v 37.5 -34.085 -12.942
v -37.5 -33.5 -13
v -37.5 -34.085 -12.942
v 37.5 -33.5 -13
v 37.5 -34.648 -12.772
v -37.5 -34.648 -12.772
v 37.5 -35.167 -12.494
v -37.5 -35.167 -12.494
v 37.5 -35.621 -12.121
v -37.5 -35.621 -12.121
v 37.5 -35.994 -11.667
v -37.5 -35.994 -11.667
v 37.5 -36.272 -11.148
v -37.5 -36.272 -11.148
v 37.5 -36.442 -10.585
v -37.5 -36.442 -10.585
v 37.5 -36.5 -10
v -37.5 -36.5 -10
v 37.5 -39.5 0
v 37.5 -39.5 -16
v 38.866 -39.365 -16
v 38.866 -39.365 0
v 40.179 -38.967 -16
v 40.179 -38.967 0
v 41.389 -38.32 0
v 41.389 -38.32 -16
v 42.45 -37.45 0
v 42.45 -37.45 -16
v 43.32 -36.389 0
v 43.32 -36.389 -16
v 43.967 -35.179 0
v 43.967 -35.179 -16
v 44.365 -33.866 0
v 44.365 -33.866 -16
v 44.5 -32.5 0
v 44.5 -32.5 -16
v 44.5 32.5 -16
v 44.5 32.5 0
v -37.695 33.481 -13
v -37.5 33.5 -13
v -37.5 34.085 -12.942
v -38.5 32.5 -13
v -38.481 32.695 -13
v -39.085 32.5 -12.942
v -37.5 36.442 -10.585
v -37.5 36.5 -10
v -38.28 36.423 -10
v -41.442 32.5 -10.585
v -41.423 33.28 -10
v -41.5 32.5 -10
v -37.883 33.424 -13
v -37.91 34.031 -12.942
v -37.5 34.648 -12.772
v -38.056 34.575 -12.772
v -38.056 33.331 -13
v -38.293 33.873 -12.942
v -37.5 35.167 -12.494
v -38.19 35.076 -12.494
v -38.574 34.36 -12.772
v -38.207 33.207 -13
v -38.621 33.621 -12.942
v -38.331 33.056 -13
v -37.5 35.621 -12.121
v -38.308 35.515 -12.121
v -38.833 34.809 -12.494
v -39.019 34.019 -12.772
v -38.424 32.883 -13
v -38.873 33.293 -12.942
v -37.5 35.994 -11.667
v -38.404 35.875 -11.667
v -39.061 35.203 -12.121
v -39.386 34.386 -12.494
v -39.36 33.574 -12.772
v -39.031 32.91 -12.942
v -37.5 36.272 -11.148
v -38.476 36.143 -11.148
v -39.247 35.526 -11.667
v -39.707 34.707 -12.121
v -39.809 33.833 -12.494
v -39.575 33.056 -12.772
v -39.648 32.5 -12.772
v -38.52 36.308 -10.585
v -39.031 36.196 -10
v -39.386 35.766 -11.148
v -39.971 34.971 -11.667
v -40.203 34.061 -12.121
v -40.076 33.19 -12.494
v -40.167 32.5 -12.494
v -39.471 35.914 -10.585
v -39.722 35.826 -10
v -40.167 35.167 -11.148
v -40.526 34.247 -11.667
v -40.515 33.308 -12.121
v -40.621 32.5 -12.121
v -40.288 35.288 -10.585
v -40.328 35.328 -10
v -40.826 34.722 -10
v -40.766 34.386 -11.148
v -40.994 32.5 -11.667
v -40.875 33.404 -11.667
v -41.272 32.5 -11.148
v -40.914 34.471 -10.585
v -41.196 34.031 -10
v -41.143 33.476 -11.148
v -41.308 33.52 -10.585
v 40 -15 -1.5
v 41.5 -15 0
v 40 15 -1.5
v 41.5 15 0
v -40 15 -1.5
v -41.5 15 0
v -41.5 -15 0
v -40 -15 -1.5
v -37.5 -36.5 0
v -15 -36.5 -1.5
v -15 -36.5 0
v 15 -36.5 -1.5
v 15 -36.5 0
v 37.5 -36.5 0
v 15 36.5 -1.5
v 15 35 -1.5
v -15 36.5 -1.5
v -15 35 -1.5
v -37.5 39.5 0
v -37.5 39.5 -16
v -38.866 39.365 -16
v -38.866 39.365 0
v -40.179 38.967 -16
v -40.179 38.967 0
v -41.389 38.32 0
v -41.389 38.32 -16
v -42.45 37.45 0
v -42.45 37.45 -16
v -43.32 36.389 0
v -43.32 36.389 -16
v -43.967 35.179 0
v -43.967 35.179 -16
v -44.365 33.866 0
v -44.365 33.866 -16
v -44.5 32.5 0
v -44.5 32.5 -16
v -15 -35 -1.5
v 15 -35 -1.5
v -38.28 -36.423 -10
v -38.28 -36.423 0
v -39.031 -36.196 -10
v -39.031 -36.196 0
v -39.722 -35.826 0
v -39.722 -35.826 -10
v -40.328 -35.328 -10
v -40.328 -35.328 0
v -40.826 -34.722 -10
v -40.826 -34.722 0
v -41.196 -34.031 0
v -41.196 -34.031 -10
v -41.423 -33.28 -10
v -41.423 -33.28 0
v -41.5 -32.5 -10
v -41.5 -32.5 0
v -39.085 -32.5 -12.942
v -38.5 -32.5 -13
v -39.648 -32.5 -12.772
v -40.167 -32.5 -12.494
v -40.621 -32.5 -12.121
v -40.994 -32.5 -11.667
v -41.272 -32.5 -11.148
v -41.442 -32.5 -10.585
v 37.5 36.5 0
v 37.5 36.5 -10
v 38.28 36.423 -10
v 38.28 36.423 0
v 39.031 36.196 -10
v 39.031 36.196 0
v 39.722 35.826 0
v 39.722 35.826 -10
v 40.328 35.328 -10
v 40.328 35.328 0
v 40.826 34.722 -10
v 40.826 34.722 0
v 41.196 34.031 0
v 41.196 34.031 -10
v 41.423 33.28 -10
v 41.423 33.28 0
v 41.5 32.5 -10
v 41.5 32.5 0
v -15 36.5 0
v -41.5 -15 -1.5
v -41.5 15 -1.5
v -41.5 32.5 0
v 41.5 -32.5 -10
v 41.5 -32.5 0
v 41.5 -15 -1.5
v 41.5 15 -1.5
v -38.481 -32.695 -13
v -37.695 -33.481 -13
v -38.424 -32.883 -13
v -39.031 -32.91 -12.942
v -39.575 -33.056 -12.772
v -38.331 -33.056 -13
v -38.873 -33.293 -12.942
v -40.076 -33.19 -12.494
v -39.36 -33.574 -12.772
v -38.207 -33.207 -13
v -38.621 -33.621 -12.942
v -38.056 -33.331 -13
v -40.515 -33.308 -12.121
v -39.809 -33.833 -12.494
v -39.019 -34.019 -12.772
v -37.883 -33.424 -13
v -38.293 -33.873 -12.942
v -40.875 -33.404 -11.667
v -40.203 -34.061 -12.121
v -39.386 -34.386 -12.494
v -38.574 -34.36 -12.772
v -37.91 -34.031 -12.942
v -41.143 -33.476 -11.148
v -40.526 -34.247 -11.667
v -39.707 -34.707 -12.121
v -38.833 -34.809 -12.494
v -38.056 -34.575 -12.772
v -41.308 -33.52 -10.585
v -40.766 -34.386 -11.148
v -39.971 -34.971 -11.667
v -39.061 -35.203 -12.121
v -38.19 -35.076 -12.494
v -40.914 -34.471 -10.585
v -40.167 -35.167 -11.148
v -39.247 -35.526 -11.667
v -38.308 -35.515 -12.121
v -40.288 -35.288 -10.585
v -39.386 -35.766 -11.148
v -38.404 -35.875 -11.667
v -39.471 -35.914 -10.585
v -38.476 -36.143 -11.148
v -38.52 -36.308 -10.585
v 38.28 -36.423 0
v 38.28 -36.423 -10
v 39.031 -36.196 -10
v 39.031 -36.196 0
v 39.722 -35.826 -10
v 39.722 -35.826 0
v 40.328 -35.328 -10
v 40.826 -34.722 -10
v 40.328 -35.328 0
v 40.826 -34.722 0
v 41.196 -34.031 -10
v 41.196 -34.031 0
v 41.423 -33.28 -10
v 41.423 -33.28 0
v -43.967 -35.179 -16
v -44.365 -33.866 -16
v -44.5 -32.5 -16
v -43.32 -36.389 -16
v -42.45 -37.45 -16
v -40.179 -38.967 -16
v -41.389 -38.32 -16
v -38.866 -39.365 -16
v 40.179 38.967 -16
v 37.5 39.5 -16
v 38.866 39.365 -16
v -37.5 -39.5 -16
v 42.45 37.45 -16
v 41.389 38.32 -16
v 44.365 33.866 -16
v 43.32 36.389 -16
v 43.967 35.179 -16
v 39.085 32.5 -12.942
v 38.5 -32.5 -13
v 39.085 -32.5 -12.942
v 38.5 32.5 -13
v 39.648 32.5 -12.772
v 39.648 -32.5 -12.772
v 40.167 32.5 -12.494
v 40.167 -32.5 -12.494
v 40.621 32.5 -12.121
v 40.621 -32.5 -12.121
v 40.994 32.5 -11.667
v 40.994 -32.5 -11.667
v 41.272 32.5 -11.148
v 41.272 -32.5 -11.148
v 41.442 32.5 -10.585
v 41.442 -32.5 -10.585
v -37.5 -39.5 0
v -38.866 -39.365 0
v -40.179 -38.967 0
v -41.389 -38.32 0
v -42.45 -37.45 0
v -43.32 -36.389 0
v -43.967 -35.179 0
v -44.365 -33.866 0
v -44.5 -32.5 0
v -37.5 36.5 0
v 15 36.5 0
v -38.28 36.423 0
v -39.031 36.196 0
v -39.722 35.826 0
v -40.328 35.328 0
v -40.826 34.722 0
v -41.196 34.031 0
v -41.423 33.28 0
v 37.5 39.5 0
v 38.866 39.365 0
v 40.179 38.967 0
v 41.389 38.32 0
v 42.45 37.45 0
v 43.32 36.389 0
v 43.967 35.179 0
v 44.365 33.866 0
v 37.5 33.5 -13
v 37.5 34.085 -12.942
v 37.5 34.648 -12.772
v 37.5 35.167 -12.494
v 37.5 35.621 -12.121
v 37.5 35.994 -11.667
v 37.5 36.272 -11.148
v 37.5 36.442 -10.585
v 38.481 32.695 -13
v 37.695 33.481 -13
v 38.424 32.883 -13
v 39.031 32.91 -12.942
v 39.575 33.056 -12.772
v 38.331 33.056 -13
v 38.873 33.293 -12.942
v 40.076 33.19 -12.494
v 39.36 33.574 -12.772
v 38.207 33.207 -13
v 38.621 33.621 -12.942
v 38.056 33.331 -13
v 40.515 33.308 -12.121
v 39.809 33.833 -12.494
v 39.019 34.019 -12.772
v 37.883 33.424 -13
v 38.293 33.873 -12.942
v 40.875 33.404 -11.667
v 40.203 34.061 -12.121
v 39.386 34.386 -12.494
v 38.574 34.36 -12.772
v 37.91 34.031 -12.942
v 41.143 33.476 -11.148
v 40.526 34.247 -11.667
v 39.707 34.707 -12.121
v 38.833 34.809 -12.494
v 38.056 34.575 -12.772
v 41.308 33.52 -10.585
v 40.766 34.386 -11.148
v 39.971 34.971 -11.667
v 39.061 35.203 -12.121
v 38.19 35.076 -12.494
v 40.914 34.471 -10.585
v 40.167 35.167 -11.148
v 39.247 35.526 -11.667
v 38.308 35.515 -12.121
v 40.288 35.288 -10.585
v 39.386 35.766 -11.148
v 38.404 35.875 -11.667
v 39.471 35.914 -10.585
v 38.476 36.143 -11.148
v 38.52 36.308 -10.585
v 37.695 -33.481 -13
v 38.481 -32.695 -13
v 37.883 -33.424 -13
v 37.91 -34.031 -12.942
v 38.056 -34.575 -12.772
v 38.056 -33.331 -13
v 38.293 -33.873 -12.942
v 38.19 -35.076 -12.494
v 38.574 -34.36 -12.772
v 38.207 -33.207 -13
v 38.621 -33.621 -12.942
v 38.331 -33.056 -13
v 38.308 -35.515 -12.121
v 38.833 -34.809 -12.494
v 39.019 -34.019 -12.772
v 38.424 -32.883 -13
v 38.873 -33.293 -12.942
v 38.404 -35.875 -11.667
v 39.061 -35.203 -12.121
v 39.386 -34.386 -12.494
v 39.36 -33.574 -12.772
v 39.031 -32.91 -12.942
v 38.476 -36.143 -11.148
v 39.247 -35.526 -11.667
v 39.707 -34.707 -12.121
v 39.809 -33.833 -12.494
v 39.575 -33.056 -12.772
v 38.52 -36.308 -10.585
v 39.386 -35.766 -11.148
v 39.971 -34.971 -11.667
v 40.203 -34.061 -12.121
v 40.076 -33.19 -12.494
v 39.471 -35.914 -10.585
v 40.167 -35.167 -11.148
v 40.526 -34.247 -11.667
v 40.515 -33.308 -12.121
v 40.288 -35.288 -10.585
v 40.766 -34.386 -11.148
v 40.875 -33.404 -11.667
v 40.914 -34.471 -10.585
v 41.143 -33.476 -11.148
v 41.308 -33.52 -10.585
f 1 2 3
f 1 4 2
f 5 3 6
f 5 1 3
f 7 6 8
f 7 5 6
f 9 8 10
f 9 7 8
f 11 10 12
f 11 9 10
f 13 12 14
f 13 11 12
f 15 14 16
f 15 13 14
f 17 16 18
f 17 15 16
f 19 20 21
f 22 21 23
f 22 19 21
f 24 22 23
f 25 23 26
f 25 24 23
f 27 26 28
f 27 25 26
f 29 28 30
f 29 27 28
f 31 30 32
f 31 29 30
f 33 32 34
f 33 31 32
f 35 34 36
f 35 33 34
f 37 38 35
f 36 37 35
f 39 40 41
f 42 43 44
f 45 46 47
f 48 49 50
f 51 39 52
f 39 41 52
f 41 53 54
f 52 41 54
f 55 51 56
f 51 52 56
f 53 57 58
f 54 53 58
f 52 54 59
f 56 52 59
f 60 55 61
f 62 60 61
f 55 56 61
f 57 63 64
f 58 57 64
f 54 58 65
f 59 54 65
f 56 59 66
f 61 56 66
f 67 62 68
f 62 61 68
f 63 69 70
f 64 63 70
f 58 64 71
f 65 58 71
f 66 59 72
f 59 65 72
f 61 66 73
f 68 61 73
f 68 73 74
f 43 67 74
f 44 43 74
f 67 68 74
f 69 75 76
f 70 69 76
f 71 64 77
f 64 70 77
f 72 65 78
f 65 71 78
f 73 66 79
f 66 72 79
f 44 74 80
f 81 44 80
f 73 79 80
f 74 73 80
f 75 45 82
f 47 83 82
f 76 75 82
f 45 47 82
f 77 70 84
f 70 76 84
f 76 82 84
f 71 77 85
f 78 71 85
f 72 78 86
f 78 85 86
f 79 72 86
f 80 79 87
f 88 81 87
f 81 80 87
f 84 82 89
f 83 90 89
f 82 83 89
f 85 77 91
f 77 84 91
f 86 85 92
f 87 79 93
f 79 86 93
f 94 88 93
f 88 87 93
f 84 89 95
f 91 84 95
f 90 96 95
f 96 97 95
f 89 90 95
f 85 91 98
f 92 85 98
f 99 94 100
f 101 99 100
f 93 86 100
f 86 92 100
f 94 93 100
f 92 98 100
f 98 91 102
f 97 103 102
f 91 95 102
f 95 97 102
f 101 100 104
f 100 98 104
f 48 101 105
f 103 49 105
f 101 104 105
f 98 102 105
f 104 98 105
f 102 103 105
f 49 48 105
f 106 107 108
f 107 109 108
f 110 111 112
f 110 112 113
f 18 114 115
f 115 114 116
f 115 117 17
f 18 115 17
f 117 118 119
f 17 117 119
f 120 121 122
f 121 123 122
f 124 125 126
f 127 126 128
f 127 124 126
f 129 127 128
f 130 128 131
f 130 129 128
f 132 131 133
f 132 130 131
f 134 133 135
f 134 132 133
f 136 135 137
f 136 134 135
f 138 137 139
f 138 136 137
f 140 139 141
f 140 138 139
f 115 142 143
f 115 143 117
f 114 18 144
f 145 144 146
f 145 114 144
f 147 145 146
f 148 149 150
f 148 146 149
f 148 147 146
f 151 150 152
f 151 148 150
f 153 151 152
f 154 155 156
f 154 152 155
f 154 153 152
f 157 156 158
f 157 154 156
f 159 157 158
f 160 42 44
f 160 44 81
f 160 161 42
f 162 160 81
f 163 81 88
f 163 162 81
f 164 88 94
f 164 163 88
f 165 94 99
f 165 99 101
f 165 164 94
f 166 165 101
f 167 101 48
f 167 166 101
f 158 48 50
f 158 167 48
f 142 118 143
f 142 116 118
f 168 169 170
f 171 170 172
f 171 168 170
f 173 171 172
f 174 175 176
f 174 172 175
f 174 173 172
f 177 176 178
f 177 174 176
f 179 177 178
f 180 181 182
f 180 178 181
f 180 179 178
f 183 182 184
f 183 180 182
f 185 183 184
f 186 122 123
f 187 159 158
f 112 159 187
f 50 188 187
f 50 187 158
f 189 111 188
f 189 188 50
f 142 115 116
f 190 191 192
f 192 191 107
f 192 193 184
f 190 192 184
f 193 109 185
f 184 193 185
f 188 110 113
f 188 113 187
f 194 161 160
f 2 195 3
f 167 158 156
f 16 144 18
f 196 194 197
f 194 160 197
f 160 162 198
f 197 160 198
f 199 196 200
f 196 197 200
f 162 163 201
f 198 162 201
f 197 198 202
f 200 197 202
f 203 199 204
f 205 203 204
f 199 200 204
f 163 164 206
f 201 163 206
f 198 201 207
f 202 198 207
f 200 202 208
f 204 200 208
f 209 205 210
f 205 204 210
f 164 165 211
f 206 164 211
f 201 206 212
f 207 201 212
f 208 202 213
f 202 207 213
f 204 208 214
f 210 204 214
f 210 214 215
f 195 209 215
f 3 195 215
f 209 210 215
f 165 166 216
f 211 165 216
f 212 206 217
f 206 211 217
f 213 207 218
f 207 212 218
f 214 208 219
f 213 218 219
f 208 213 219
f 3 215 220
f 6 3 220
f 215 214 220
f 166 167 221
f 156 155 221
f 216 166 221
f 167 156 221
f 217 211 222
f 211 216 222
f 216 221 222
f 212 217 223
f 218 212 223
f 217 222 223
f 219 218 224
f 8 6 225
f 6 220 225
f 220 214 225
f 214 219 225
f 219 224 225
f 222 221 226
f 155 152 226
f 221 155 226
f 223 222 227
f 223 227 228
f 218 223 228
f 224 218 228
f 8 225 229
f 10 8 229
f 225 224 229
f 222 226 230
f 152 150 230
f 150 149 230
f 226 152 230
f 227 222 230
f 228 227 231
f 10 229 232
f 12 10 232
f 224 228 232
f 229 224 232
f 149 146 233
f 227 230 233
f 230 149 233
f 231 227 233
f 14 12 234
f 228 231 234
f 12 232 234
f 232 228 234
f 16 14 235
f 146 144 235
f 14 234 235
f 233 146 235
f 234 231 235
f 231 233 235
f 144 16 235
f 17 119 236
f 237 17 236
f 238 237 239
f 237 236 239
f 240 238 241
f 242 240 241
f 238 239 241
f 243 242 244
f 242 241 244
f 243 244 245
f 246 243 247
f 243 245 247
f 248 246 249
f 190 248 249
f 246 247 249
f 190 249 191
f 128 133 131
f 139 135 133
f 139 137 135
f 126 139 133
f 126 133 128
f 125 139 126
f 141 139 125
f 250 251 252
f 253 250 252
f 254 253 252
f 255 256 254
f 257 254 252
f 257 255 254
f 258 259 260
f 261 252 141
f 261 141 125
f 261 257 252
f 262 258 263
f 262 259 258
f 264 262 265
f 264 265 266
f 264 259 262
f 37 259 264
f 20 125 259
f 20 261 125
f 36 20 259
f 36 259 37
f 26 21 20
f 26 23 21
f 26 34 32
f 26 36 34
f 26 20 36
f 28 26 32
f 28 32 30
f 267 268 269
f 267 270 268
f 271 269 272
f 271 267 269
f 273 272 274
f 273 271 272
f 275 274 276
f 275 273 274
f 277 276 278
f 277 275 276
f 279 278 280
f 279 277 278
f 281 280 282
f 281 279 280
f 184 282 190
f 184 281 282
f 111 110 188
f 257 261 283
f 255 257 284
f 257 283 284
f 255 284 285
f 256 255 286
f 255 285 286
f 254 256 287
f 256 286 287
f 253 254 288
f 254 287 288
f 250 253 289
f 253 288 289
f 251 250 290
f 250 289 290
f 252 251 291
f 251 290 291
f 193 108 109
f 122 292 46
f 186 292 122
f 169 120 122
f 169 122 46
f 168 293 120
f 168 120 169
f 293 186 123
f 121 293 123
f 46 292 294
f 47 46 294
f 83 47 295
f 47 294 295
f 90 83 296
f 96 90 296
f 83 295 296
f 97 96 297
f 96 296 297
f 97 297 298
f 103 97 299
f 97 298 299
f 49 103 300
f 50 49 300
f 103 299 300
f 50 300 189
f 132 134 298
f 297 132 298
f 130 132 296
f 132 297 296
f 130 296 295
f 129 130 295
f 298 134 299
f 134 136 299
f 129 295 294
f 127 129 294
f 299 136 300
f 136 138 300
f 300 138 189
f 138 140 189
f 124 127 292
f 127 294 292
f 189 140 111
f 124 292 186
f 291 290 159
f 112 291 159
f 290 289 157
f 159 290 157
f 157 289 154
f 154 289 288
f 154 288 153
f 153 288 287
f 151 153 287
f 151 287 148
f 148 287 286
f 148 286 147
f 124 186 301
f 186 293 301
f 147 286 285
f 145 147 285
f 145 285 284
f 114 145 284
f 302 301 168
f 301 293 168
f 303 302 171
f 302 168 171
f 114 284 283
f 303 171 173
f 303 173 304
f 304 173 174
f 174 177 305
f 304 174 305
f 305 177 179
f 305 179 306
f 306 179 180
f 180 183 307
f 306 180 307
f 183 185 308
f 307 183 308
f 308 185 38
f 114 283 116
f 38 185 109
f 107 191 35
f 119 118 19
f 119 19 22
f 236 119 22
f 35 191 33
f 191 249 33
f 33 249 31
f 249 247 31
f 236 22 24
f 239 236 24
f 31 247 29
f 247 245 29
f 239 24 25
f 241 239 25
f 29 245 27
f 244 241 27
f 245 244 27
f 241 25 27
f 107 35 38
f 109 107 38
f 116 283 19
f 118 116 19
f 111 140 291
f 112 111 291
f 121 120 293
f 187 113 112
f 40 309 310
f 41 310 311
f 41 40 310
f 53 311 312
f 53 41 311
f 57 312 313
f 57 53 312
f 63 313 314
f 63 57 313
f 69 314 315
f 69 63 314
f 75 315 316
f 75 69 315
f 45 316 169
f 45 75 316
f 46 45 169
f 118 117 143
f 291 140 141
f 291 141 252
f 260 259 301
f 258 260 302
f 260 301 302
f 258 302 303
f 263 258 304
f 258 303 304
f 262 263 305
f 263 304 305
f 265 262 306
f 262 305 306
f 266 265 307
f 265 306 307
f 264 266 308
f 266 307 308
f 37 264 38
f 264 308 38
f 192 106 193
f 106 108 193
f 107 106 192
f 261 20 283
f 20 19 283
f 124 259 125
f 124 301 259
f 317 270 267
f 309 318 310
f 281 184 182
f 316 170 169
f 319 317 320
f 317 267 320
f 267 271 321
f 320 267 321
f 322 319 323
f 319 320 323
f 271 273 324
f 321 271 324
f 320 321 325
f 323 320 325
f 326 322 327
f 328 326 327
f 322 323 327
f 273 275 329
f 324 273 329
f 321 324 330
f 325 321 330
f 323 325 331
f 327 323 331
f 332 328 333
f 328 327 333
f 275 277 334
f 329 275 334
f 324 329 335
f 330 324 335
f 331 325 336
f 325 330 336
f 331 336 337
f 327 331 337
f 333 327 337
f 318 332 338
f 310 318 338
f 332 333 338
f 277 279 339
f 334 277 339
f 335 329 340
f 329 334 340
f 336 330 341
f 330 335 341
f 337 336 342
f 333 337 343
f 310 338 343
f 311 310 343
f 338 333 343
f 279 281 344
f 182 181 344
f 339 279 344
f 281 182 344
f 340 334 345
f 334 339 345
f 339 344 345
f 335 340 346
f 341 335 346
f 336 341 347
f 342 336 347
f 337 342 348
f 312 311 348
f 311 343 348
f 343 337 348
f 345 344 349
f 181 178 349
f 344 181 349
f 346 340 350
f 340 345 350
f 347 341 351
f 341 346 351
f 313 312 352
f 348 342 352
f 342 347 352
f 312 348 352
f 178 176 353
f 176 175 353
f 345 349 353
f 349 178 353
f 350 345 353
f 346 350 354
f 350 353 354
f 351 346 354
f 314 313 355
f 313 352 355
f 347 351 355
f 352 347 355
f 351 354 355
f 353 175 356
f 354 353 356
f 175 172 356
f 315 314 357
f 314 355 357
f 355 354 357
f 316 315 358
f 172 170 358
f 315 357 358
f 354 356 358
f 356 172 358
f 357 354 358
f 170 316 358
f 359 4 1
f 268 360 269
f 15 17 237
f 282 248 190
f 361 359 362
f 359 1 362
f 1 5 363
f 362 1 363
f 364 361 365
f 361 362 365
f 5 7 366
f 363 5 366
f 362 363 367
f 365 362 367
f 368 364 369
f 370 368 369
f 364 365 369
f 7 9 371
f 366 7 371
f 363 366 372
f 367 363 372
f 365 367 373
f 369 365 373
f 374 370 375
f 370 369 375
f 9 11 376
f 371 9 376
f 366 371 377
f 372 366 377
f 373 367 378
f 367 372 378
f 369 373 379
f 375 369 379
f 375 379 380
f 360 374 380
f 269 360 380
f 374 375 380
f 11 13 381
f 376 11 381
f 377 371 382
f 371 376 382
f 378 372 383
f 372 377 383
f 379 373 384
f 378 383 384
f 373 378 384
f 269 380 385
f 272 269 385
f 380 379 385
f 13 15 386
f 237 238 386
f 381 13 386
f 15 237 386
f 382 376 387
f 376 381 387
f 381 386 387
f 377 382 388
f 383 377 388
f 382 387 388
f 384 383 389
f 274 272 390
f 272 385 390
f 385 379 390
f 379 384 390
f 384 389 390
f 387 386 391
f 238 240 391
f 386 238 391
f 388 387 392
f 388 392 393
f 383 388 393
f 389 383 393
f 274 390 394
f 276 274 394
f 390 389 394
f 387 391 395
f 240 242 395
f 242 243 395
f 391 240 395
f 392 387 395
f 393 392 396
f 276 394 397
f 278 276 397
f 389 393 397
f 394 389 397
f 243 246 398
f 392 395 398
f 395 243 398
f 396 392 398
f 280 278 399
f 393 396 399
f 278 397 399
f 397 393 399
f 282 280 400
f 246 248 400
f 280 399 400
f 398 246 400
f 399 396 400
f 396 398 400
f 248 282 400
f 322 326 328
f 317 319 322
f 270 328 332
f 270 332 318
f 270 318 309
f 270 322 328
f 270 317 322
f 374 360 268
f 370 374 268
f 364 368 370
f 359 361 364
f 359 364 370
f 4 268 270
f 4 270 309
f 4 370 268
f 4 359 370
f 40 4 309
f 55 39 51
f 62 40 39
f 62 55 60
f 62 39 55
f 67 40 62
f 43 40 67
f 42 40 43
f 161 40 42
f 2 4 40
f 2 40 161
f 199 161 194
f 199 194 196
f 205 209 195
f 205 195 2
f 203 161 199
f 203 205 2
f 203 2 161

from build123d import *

# Parameters (mm, degrees)
PAD001_DEPTH            = 15
PAD_DEPTH               = 16
PAD002_DEPTH            = 3
PAD003_DEPTH            = 15
PAD001_MIRRORED_2_DEPTH = 15
PAD_MIRRORED_2_DEPTH    = 16
PAD002_MIRRORED_2_DEPTH = 3
PAD003_MIRRORED_2_DEPTH = 15
FILLET_R                = 3


with BuildPart() as part:
    # Sketch001 → Pad001 (new body)
    with BuildSketch(Plane(origin=(-41.5, 0, 0), x_dir=(-1, 0, 0), z_dir=(0, 1, 0))):
        Polygon((0, 0), (-1.5, -1.5), (0, -1.5), align=None)
    pad001 = extrude(amount=PAD001_DEPTH)

    # Sketch → Pad (join)
    with BuildSketch(Plane.XY):
        with BuildLine():
            Line((0, 36.5), (-37.5, 36.5))
            ThreePointArc((-37.5, 36.5), (-40.328427, 35.328427), (-41.5, 32.5))
            Line((-41.5, 32.5), (-41.5, 0))
            Line((-41.5, 0), (-44.5, 0))
            Line((-44.5, 0), (-44.5, 32.5))
            ThreePointArc((-37.5, 39.5), (-42.449747, 37.449747), (-44.5, 32.5))
            Line((-37.5, 39.5), (0, 39.5))
            Line((0, 36.5), (0, 39.5))
        make_face()
    pad = extrude(amount=-PAD_DEPTH)

    # Sketch002 (on Face14 of Pad) → Pad002 (join)
    with BuildSketch(Plane(origin=(-41.5, 0, -16), x_dir=(-1, 0, 0), z_dir=(0, 0, -1))):
        with BuildLine():
            Line((-41.5, 39.5), (-4, 39.5))
            ThreePointArc((3, 32.5), (0.949747, 37.449747), (-4, 39.5))
            Line((3, 32.5), (3, 0))
            Line((3, 0), (-41.5, 0))
            Line((-41.5, 0), (-41.5, 39.5))
        make_face()
    pad002 = extrude(amount=-PAD002_DEPTH)

    # Sketch003 (on Face6 of Pad002) → Pad003 (join)
    with BuildSketch(Plane(origin=(0, 36.5, 0), x_dir=(0, 1, 0), z_dir=(-1, 0, 0))):
        Polygon((0, 0), (-1.5, 1.5), (0, 1.5), align=None)
    pad003 = extrude(amount=PAD003_DEPTH)

    # Sketch001 Mirrored 2 → Pad001 Mirrored 2 (add)
    with BuildSketch(Plane(origin=(-41.5, 0, 0), x_dir=(-1, 0, 0), z_dir=(0, 1, 0))):
        Polygon((0, 0), (-1.5, -1.5), (0, -1.5), align=None)
    pad001_mirrored_2 = extrude(amount=-PAD001_MIRRORED_2_DEPTH)

    # Sketch Mirrored 2 → Pad Mirrored 2 (add)
    with BuildSketch(Plane(origin=(0, 0, 0), x_dir=(1, 0, 0), z_dir=(0, 0, -1))):
        with BuildLine():
            Line((0, 36.5), (-37.5, 36.5))
            ThreePointArc((-37.5, 36.5), (-40.328427, 35.328427), (-41.5, 32.5))
            Line((-41.5, 32.5), (-41.5, 0))
            Line((-41.5, 0), (-44.5, 0))
            Line((-44.5, 0), (-44.5, 32.5))
            ThreePointArc((-37.5, 39.5), (-42.449747, 37.449747), (-44.5, 32.5))
            Line((-37.5, 39.5), (0, 39.5))
            Line((0, 36.5), (0, 39.5))
        make_face()
    pad_mirrored_2 = extrude(amount=PAD_MIRRORED_2_DEPTH)

    # Sketch002 Mirrored 2 → Pad002 Mirrored 2 (add)
    with BuildSketch(Plane(origin=(-41.5, 0, -16), x_dir=(-1, 0, 0), z_dir=(0, 0, 1))):
        with BuildLine():
            Line((-41.5, 39.5), (-4, 39.5))
            ThreePointArc((3, 32.5), (0.949747, 37.449747), (-4, 39.5))
            Line((3, 32.5), (3, 0))
            Line((3, 0), (-41.5, 0))
            Line((-41.5, 0), (-41.5, 39.5))
        make_face()
    pad002_mirrored_2 = extrude(amount=PAD002_MIRRORED_2_DEPTH)

    # Sketch003 Mirrored 2 → Pad003 Mirrored 2 (add)
    with BuildSketch(Plane(origin=(0, -36.5, 0), x_dir=(0, -1, 0), z_dir=(1, 0, 0))):
        Polygon((0, 0), (-1.5, 1.5), (0, 1.5), align=None)
    pad003_mirrored_2 = extrude(amount=-PAD003_MIRRORED_2_DEPTH)

    # Mirrored001: Pad001, Pad, Pad002, Pad003, Pad001 Mirrored 2, Pad Mirrored 2, Pad002 Mirrored 2, Pad003 Mirrored 2 across YZ
    add(pad001.mirror(Plane.YZ))
    add(pad.mirror(Plane.YZ))
    add(pad002.mirror(Plane.YZ))
    add(pad003.mirror(Plane.YZ))
    add(pad001_mirrored_2.mirror(Plane.YZ))
    add(pad_mirrored_2.mirror(Plane.YZ))
    add(pad002_mirrored_2.mirror(Plane.YZ))
    add(pad003_mirrored_2.mirror(Plane.YZ))

    # Fillet
    fillet_edges = [part.edges().sort_by_distance(p)[0] for p in [
        (-41.5, 16.25, -13),
        (-40.328427, 35.328427, -13),
        (-18.75, 36.5, -13),
        (0, 18.25, -13),
        (-20.75, 0, -13),
        (41.5, 16.25, -13),
        (40.328427, 35.328427, -13),
        (18.75, 36.5, -13),
        (20.75, 0, -13),
        (41.5, -16.25, -13),
        (40.328427, -35.328427, -13),
        (18.75, -36.5, -13),
        (0, -18.25, -13),
        (-41.5, -16.25, -13),
        (-40.328427, -35.328427, -13),
        (-18.75, -36.5, -13),
    ]]
    fillet(fillet_edges, radius=FILLET_R)


solid = part.part
